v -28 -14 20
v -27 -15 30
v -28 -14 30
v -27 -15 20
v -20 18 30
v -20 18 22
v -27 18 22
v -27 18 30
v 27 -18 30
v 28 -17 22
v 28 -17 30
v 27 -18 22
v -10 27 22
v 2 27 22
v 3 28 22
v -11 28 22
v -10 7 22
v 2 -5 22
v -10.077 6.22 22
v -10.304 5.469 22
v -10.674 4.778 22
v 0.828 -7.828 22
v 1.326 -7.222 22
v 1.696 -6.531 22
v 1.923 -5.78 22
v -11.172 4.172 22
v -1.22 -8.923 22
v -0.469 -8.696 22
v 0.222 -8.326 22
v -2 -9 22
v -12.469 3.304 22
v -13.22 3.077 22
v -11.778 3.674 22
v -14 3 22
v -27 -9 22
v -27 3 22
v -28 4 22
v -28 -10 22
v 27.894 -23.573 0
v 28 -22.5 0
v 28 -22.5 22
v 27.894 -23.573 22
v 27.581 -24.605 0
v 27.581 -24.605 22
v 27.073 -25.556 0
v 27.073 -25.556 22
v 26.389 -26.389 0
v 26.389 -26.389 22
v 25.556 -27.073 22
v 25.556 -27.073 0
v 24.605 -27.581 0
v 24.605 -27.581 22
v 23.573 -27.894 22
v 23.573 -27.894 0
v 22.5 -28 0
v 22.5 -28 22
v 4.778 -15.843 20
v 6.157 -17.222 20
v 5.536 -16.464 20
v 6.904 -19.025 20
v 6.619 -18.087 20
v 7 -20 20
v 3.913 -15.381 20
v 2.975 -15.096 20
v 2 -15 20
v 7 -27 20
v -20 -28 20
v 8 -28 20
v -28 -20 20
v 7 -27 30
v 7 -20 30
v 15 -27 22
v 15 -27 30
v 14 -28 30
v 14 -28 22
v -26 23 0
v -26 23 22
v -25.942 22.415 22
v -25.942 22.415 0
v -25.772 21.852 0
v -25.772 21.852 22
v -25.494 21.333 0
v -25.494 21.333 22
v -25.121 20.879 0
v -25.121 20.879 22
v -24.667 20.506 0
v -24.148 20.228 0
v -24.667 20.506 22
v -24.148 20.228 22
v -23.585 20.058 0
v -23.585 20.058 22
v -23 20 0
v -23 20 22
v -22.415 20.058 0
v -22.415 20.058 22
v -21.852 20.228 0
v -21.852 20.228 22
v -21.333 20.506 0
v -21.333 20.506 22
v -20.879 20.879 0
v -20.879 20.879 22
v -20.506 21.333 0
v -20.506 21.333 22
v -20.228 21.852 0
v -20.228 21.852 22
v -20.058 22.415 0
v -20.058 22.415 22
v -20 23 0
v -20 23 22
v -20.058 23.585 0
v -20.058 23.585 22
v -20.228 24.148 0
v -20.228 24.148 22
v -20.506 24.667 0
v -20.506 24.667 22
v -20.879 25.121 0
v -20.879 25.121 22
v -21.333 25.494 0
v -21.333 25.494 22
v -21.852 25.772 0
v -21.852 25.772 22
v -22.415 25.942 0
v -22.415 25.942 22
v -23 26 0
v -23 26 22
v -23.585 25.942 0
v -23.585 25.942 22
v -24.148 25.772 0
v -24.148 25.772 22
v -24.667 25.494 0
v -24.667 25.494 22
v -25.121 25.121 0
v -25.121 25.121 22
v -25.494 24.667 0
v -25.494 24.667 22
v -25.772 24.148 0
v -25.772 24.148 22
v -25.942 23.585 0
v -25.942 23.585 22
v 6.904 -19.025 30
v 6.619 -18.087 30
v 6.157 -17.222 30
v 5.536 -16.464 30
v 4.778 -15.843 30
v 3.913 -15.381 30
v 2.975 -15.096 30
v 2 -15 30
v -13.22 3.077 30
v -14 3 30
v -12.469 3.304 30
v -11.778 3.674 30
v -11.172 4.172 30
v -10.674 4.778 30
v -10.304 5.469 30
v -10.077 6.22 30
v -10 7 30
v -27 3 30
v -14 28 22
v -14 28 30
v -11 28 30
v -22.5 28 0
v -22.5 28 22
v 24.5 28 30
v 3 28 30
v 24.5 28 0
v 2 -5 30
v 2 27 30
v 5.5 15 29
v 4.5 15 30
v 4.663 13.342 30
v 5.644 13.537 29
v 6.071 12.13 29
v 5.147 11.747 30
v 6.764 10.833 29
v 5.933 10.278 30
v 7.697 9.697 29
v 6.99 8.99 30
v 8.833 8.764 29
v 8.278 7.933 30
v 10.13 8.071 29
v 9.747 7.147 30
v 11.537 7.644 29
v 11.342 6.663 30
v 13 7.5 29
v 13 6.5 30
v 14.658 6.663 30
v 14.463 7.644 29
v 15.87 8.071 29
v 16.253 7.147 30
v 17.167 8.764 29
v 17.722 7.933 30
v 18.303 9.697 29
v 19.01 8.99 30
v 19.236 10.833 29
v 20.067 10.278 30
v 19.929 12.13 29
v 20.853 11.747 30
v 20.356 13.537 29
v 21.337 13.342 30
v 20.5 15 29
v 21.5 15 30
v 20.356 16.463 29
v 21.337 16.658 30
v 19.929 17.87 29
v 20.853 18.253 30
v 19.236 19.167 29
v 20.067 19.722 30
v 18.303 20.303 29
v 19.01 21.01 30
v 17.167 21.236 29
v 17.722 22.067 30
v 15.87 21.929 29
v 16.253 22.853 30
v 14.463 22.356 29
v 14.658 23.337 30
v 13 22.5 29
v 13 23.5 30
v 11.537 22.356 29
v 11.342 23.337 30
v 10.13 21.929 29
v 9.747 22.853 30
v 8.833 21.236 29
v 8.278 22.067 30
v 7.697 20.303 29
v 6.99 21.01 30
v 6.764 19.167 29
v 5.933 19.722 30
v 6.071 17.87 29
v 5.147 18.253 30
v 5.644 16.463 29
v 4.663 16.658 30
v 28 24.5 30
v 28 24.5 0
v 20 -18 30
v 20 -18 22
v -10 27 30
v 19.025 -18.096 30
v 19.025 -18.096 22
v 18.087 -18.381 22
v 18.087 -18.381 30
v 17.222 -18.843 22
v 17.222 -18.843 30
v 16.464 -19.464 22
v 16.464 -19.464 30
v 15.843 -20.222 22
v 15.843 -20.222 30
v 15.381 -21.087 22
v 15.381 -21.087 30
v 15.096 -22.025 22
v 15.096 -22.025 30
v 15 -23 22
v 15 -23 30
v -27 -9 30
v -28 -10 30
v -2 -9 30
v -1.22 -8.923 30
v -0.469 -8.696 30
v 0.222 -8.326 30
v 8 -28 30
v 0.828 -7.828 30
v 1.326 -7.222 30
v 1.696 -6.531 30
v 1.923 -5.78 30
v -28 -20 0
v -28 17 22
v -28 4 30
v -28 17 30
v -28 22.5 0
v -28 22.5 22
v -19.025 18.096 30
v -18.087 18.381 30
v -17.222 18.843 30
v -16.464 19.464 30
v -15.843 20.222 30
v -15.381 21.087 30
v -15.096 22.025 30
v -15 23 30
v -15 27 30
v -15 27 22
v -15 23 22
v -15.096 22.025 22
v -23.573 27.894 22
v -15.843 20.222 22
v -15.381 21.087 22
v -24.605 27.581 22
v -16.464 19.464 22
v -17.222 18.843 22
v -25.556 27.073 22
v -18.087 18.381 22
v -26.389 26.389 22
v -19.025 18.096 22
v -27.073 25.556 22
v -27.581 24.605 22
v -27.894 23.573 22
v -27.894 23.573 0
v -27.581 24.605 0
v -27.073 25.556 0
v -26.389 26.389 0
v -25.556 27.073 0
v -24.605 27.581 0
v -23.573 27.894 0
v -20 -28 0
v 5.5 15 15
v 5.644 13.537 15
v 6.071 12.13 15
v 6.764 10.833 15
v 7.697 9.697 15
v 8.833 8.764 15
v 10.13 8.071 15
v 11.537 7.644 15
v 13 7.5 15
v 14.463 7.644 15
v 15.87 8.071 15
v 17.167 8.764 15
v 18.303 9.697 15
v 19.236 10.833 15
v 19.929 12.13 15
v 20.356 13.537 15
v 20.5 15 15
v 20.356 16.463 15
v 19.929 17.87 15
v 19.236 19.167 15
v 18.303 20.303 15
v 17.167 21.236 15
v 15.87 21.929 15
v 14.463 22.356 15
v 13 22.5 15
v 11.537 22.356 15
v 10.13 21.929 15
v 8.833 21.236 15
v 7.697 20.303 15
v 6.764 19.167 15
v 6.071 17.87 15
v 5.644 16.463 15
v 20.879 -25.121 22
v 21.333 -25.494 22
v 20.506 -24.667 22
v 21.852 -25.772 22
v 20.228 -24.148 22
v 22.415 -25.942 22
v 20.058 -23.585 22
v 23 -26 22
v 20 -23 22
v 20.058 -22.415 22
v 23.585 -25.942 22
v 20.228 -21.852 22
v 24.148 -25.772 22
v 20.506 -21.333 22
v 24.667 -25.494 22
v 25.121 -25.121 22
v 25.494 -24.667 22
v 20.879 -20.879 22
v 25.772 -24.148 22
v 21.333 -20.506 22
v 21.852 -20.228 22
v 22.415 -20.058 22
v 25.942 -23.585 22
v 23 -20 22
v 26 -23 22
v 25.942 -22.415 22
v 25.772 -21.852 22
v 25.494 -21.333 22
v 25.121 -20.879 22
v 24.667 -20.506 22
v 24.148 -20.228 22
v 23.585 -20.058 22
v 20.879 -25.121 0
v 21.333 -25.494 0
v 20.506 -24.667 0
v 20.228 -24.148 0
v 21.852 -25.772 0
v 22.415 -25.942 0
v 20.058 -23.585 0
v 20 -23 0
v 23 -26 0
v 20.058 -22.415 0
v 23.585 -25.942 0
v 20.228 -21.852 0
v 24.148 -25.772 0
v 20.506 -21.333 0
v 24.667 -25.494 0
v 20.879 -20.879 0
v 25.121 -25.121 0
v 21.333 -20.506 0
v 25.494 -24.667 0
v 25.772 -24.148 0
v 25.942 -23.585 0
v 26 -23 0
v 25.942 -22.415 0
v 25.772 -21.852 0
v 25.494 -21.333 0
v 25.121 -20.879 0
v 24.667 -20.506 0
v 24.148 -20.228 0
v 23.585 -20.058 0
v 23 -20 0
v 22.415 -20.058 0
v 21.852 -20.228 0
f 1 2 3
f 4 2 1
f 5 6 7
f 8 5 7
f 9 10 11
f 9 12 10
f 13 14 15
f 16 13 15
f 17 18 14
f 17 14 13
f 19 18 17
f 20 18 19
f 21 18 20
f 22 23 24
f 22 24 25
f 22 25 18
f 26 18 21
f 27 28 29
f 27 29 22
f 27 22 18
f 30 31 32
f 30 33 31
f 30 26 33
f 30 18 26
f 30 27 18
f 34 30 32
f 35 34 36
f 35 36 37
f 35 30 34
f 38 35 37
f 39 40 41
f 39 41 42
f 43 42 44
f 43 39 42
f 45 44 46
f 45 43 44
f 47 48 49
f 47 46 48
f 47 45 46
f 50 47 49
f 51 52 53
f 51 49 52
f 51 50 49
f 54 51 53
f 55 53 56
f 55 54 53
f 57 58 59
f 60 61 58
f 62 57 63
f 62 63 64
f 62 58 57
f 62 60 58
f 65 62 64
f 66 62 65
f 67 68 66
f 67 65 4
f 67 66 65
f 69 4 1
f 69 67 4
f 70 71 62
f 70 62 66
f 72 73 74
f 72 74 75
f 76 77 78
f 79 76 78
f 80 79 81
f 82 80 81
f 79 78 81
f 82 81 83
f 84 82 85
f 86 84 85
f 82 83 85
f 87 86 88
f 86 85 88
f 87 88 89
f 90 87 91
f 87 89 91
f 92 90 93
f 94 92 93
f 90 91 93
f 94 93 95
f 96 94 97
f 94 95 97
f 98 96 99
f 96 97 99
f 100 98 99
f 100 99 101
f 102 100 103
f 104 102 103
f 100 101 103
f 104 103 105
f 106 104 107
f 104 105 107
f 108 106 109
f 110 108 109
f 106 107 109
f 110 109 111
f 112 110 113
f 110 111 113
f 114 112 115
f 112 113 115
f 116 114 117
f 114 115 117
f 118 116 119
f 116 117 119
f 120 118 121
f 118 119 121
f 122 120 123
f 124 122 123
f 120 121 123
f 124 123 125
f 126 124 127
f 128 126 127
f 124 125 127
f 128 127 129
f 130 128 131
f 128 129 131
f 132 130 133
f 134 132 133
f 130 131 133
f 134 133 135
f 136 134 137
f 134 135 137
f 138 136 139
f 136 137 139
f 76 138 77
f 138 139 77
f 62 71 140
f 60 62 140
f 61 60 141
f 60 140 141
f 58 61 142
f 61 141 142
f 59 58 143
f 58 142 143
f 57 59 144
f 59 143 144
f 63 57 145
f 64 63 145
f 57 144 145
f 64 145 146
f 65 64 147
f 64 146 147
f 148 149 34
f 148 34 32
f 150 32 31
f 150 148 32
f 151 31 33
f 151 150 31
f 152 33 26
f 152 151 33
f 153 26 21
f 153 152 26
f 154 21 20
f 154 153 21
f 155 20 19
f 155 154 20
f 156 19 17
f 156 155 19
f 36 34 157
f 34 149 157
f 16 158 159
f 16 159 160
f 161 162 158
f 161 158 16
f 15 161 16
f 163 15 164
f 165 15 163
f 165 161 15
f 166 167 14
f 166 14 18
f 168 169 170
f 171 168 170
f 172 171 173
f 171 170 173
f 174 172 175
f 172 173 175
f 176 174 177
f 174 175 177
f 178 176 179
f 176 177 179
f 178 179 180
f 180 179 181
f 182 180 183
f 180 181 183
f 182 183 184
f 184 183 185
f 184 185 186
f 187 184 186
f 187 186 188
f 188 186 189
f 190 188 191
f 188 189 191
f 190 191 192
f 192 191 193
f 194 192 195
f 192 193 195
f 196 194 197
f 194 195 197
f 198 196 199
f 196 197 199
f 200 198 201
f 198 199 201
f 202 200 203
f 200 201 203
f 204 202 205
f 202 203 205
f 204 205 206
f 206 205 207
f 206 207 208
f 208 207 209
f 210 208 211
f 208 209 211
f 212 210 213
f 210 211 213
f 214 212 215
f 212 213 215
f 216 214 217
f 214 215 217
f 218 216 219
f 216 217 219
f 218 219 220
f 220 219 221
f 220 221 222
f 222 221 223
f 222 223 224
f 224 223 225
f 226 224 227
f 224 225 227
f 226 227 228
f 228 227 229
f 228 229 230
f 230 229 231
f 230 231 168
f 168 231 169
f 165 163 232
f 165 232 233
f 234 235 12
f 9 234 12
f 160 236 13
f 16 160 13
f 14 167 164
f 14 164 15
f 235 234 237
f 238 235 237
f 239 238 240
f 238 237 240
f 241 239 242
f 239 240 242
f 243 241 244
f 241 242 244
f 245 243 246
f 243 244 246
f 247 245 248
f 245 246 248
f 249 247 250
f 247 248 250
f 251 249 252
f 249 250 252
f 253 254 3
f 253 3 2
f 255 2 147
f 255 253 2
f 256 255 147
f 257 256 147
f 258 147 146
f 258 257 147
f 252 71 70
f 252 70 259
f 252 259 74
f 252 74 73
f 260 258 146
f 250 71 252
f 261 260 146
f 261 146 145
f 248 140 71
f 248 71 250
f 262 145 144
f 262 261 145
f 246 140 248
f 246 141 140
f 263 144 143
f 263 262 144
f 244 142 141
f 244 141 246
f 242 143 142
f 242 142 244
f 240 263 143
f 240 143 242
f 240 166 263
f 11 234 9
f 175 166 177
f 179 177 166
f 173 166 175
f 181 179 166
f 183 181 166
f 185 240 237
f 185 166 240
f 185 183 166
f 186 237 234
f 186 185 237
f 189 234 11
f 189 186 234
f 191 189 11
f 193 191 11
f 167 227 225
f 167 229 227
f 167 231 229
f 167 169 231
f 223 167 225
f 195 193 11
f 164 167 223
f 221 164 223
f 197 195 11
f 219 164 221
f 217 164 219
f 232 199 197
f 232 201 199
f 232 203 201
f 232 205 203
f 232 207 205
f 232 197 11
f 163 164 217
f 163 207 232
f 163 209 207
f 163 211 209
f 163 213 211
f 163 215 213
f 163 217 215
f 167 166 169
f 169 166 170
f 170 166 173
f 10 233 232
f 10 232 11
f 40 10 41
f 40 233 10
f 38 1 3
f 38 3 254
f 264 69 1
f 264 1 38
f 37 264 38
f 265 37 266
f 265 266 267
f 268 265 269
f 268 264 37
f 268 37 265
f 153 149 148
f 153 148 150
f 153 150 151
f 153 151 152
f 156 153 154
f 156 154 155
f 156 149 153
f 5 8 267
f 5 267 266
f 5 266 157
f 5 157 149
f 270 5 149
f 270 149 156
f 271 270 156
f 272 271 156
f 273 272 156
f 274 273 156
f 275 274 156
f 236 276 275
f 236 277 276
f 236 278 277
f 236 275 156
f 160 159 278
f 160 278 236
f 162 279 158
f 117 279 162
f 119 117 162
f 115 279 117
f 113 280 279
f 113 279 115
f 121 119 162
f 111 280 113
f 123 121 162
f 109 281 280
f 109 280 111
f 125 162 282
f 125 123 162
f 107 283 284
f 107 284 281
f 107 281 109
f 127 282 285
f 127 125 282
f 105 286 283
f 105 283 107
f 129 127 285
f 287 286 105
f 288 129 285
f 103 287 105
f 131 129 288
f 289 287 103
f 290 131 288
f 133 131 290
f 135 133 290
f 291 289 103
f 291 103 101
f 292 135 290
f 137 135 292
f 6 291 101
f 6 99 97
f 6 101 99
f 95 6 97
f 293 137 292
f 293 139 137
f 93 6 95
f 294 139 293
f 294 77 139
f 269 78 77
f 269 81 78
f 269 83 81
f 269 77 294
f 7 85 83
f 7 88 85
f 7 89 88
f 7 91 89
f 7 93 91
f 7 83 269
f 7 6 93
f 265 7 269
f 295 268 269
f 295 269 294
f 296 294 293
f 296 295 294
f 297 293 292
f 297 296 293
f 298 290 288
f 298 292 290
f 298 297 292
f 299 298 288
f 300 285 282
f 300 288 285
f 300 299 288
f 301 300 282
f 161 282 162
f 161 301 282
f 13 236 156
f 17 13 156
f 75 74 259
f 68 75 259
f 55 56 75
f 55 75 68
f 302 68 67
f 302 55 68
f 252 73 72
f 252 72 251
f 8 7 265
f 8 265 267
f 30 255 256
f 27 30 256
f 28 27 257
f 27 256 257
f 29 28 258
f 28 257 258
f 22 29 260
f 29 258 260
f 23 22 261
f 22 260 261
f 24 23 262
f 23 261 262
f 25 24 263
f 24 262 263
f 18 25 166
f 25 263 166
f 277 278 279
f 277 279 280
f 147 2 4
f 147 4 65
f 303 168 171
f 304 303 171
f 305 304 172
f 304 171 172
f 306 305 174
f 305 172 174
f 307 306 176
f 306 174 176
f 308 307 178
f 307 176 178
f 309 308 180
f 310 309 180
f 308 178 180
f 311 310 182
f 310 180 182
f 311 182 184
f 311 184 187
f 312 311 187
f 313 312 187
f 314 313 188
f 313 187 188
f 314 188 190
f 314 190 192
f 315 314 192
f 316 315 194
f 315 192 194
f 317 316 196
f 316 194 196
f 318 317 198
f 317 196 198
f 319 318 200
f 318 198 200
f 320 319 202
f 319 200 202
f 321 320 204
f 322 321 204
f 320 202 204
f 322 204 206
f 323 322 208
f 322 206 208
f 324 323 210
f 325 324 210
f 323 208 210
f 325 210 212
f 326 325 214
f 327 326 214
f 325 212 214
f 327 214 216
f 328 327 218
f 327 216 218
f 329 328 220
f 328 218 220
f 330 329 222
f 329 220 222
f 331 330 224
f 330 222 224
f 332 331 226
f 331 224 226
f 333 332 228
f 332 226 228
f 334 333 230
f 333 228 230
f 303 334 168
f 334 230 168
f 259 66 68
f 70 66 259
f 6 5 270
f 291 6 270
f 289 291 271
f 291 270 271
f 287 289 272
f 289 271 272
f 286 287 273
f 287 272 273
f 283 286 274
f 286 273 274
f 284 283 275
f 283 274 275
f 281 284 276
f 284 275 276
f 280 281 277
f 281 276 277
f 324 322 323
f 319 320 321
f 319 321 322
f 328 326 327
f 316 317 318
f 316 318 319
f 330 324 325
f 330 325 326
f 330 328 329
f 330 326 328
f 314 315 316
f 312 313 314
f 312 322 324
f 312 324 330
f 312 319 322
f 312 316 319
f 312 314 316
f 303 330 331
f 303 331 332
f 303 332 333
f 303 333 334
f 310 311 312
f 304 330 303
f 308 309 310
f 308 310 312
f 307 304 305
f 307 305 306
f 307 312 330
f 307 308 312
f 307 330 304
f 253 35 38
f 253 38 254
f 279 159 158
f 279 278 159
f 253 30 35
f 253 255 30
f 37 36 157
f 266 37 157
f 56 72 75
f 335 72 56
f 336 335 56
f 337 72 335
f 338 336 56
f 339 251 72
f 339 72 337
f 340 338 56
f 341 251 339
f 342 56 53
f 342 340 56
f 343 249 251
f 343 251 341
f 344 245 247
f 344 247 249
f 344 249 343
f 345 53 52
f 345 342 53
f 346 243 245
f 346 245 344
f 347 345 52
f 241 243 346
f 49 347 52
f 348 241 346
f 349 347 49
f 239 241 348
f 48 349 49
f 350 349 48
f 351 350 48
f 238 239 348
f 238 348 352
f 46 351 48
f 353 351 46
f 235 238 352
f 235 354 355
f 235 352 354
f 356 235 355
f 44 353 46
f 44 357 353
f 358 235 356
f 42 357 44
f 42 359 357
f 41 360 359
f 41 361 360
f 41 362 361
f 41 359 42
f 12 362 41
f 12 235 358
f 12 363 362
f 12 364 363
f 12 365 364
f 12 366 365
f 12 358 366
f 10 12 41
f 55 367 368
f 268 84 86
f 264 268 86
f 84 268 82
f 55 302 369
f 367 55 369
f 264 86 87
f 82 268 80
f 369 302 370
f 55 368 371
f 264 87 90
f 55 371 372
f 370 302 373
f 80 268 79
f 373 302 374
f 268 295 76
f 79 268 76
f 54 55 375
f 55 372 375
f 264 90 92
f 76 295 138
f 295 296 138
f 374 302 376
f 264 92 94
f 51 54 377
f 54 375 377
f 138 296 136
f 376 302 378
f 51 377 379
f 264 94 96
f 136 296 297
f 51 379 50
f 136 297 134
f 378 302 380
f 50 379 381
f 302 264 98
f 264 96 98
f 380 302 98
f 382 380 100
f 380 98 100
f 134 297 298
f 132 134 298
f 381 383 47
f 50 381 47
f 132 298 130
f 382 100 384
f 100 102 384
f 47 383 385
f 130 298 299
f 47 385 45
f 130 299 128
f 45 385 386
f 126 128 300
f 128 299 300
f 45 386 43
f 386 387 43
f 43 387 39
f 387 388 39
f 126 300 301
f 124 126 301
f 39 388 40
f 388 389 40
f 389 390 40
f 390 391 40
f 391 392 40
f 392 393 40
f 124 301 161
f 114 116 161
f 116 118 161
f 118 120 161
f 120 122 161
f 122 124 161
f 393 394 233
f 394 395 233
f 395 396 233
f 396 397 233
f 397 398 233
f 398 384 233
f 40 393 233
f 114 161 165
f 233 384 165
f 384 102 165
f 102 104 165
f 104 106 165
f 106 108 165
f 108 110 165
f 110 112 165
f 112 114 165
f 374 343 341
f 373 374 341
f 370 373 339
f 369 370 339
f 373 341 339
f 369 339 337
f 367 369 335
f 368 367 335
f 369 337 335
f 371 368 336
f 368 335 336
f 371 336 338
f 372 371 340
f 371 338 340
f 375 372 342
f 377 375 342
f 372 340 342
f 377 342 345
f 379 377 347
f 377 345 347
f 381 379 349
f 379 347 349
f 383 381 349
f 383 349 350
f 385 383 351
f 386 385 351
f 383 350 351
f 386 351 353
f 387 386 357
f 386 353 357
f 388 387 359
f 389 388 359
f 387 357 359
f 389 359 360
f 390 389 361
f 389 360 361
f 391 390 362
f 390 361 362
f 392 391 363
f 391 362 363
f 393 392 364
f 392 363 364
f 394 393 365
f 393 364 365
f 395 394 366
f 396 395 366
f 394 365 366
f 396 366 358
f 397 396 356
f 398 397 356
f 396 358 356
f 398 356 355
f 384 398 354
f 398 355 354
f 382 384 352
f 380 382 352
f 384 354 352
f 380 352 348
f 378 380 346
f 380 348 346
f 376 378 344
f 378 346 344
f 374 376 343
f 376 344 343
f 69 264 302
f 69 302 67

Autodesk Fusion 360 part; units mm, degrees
sketch "Schizzo1" plane through (0, 0, 0) normal (0, 0, 1) x (1, 0, 0)
  line L0 (30, -30) -> (-30, -30)
  line L1 (-30, -30) -> (-30, 30)
  line L2 (-30, 30) -> (30, 30)
  line L3 (30, 30) -> (30, -30)
  line L4 (30, -30) -> (-30, 30) construction
  line L5 (-30, -30) -> (30, 30) construction
  line L6 (22.5, -28) -> (-22.5, -28)
  line L7 (-28, -22.5) -> (-28, 22.5)
  line L8 (-22.5, 28) -> (22.5, 28)
  line L9 (28, 22.5) -> (28, -22.5)
  arc A0 (-22.5, 28) -> (-28, 22.5) centre (-22.5, 22.5) ccw
  arc A1 (28, 22.5) -> (22.5, 28) centre (22.5, 22.5) ccw
  arc A2 (22.5, -28) -> (28, -22.5) centre (22.5, -22.5) ccw
  arc A3 (-28, -22.5) -> (-22.5, -28) centre (-22.5, -22.5) ccw
  dimension "d1" = 60
  dimension "d2" = 60
  dimension "d4" = 5.5
extrude "Estrusione1" add sketch "Schizzo1" along normal blind 30 contours L6 L7 L8 L9 A0 A1 A2 A3
sketch "Schizzo2" plane through (0, 0, 30) normal (0, 0, 1) x (-1, 0, 0)
  arc A0 (22.5, -28) -> (28, -22.5) centre (22.5, -22.5) ccw
  line L0 (28, -22.5) -> (28, 22.5)
  arc A1 (28, 22.5) -> (22.5, 28) centre (22.5, 22.5) ccw
  line L1 (22.5, 28) -> (-22.5, 28)
  arc A2 (-22.5, 28) -> (-28, 22.5) centre (-22.5, 22.5) ccw
  line L2 (-28, 22.5) -> (-28, -22.5)
  arc A3 (-28, -22.5) -> (-22.5, -28) centre (-22.5, -22.5) ccw
  line L3 (-22.5, -28) -> (22.5, -28)
  line L4 (15, -28) -> (15, -23)
  line L5 (20, -18) -> (28, -18)
  arc A4 (20, -18) -> (15, -23) centre (20, -23) ccw
  dimension "d7" = 5
  dimension "d8" = 13
  dimension "d9" = 10
extrude "Estrusione2" cut sketch "Schizzo2" against normal blind 8 contours A0 L0 L3 L4 L5 A4
pattern_circular "Serie C1" count 2 over 360 about axis through (0, 0, 1.75) along (0, 0, 1) of "Estrusione2"
sketch "Schizzo3" plane through (0, 0, 30) normal (0, 0, 1) x (-1, 0, 0)
  line L0 (-20, 18) -> (-28, 18)
  line L1 (-28, 18) -> (-28, -22.5)
  arc A0 (-28, -22.5) -> (-22.5, -28) centre (-22.5, -22.5) ccw
  line L2 (-22.5, -28) -> (15, -28)
  line L3 (15, -28) -> (15, -23)
  arc A1 (20, -18) -> (15, -23) centre (20, -23) ccw
  line L4 (20, -18) -> (28, -18)
  line L5 (28, -18) -> (28, 22.5)
  arc A2 (28, 22.5) -> (22.5, 28) centre (22.5, 22.5) ccw
  line L6 (22.5, 28) -> (-15, 28)
  line L7 (-15, 28) -> (-15, 23)
  arc A3 (-20, 18) -> (-15, 23) centre (-20, 23) ccw
  line L8 (10, -28) -> (10, -7)
  line L9 (14, -3) -> (28, -3)
  line L10 (-2, -28) -> (-2, 5)
  line L11 (2, 9) -> (28, 9)
  arc A4 (14, -3) -> (10, -7) centre (14, -7) ccw
  arc A5 (2, 9) -> (-2, 5) centre (2, 5) ccw
  circle A6 centre (-13, -15) radius 7.5
  circle A7 centre (23, -23) radius 3
  circle A8 centre (-23, 23) radius 3
  line L12 (28, 15) -> (-2, 15)
  line L13 (-7, 20) -> (-7, 28)
  arc A9 (-7, 20) -> (-2, 15) centre (-2, 20) ccw
  point P0 (-28, 18)
  dimension "d14" = 12
  dimension "d15" = 18
  dimension "d16" = 25
  dimension "d17" = 12
  dimension "d18" = 4
  dimension "d19" = 15
  dimension "d20" = 6
  dimension "d21" = 6
  dimension "d22" = 5
  dimension "d23" = 5
  dimension "d24" = 5
  dimension "d25" = 5
  dimension "d26" = 13
  dimension "d27" = 15
  dimension "d28" = 13
  dimension "d29" = 35
  dimension "d30" = 5
extrude "Estrusione3" cut sketch "Schizzo3" against normal blind 85 contours A7 | A8
extrude "Estrusione4" cut sketch "Schizzo3" against normal blind 15 contours A6
extrude "Estrusione5" cut sketch "Schizzo3" against normal blind 8 contours L2 L5 L8 L9 L10 L11 A4 A5
extrude "Estrusione6" cut sketch "Schizzo3" against normal blind 10 contours L5 A2 L6 L12 L13 A9
delete_face "EliminaFaccia1" 1 faces at (-27.845, -23.7967, 13.3333)
delete_face "EliminaFaccia2" 1 faces at (26.4805, 26.2954, 20)
chamfer "Smusso1" distance 3.5 angle 45 1 edges at (28, 28, 15)
chamfer "Smusso2" distance 8 angle 45 1 edges at (-28, -28, 10)
chamfer "Smusso3" distance 1 angle 45 10 edges at (-28, -15, 25) (-28, -9, 26) (-28, 3, 26) (-28, 18, 26) (-15, 28, 26) (-10, 28, 26) (2, 28, 26) (15, -28, 26) (28, -18, 26) (7, -28, 25)
chamfer "Smusso6" distance 1 angle 45 1 edges at (19.9925, 12.2879, 30)
